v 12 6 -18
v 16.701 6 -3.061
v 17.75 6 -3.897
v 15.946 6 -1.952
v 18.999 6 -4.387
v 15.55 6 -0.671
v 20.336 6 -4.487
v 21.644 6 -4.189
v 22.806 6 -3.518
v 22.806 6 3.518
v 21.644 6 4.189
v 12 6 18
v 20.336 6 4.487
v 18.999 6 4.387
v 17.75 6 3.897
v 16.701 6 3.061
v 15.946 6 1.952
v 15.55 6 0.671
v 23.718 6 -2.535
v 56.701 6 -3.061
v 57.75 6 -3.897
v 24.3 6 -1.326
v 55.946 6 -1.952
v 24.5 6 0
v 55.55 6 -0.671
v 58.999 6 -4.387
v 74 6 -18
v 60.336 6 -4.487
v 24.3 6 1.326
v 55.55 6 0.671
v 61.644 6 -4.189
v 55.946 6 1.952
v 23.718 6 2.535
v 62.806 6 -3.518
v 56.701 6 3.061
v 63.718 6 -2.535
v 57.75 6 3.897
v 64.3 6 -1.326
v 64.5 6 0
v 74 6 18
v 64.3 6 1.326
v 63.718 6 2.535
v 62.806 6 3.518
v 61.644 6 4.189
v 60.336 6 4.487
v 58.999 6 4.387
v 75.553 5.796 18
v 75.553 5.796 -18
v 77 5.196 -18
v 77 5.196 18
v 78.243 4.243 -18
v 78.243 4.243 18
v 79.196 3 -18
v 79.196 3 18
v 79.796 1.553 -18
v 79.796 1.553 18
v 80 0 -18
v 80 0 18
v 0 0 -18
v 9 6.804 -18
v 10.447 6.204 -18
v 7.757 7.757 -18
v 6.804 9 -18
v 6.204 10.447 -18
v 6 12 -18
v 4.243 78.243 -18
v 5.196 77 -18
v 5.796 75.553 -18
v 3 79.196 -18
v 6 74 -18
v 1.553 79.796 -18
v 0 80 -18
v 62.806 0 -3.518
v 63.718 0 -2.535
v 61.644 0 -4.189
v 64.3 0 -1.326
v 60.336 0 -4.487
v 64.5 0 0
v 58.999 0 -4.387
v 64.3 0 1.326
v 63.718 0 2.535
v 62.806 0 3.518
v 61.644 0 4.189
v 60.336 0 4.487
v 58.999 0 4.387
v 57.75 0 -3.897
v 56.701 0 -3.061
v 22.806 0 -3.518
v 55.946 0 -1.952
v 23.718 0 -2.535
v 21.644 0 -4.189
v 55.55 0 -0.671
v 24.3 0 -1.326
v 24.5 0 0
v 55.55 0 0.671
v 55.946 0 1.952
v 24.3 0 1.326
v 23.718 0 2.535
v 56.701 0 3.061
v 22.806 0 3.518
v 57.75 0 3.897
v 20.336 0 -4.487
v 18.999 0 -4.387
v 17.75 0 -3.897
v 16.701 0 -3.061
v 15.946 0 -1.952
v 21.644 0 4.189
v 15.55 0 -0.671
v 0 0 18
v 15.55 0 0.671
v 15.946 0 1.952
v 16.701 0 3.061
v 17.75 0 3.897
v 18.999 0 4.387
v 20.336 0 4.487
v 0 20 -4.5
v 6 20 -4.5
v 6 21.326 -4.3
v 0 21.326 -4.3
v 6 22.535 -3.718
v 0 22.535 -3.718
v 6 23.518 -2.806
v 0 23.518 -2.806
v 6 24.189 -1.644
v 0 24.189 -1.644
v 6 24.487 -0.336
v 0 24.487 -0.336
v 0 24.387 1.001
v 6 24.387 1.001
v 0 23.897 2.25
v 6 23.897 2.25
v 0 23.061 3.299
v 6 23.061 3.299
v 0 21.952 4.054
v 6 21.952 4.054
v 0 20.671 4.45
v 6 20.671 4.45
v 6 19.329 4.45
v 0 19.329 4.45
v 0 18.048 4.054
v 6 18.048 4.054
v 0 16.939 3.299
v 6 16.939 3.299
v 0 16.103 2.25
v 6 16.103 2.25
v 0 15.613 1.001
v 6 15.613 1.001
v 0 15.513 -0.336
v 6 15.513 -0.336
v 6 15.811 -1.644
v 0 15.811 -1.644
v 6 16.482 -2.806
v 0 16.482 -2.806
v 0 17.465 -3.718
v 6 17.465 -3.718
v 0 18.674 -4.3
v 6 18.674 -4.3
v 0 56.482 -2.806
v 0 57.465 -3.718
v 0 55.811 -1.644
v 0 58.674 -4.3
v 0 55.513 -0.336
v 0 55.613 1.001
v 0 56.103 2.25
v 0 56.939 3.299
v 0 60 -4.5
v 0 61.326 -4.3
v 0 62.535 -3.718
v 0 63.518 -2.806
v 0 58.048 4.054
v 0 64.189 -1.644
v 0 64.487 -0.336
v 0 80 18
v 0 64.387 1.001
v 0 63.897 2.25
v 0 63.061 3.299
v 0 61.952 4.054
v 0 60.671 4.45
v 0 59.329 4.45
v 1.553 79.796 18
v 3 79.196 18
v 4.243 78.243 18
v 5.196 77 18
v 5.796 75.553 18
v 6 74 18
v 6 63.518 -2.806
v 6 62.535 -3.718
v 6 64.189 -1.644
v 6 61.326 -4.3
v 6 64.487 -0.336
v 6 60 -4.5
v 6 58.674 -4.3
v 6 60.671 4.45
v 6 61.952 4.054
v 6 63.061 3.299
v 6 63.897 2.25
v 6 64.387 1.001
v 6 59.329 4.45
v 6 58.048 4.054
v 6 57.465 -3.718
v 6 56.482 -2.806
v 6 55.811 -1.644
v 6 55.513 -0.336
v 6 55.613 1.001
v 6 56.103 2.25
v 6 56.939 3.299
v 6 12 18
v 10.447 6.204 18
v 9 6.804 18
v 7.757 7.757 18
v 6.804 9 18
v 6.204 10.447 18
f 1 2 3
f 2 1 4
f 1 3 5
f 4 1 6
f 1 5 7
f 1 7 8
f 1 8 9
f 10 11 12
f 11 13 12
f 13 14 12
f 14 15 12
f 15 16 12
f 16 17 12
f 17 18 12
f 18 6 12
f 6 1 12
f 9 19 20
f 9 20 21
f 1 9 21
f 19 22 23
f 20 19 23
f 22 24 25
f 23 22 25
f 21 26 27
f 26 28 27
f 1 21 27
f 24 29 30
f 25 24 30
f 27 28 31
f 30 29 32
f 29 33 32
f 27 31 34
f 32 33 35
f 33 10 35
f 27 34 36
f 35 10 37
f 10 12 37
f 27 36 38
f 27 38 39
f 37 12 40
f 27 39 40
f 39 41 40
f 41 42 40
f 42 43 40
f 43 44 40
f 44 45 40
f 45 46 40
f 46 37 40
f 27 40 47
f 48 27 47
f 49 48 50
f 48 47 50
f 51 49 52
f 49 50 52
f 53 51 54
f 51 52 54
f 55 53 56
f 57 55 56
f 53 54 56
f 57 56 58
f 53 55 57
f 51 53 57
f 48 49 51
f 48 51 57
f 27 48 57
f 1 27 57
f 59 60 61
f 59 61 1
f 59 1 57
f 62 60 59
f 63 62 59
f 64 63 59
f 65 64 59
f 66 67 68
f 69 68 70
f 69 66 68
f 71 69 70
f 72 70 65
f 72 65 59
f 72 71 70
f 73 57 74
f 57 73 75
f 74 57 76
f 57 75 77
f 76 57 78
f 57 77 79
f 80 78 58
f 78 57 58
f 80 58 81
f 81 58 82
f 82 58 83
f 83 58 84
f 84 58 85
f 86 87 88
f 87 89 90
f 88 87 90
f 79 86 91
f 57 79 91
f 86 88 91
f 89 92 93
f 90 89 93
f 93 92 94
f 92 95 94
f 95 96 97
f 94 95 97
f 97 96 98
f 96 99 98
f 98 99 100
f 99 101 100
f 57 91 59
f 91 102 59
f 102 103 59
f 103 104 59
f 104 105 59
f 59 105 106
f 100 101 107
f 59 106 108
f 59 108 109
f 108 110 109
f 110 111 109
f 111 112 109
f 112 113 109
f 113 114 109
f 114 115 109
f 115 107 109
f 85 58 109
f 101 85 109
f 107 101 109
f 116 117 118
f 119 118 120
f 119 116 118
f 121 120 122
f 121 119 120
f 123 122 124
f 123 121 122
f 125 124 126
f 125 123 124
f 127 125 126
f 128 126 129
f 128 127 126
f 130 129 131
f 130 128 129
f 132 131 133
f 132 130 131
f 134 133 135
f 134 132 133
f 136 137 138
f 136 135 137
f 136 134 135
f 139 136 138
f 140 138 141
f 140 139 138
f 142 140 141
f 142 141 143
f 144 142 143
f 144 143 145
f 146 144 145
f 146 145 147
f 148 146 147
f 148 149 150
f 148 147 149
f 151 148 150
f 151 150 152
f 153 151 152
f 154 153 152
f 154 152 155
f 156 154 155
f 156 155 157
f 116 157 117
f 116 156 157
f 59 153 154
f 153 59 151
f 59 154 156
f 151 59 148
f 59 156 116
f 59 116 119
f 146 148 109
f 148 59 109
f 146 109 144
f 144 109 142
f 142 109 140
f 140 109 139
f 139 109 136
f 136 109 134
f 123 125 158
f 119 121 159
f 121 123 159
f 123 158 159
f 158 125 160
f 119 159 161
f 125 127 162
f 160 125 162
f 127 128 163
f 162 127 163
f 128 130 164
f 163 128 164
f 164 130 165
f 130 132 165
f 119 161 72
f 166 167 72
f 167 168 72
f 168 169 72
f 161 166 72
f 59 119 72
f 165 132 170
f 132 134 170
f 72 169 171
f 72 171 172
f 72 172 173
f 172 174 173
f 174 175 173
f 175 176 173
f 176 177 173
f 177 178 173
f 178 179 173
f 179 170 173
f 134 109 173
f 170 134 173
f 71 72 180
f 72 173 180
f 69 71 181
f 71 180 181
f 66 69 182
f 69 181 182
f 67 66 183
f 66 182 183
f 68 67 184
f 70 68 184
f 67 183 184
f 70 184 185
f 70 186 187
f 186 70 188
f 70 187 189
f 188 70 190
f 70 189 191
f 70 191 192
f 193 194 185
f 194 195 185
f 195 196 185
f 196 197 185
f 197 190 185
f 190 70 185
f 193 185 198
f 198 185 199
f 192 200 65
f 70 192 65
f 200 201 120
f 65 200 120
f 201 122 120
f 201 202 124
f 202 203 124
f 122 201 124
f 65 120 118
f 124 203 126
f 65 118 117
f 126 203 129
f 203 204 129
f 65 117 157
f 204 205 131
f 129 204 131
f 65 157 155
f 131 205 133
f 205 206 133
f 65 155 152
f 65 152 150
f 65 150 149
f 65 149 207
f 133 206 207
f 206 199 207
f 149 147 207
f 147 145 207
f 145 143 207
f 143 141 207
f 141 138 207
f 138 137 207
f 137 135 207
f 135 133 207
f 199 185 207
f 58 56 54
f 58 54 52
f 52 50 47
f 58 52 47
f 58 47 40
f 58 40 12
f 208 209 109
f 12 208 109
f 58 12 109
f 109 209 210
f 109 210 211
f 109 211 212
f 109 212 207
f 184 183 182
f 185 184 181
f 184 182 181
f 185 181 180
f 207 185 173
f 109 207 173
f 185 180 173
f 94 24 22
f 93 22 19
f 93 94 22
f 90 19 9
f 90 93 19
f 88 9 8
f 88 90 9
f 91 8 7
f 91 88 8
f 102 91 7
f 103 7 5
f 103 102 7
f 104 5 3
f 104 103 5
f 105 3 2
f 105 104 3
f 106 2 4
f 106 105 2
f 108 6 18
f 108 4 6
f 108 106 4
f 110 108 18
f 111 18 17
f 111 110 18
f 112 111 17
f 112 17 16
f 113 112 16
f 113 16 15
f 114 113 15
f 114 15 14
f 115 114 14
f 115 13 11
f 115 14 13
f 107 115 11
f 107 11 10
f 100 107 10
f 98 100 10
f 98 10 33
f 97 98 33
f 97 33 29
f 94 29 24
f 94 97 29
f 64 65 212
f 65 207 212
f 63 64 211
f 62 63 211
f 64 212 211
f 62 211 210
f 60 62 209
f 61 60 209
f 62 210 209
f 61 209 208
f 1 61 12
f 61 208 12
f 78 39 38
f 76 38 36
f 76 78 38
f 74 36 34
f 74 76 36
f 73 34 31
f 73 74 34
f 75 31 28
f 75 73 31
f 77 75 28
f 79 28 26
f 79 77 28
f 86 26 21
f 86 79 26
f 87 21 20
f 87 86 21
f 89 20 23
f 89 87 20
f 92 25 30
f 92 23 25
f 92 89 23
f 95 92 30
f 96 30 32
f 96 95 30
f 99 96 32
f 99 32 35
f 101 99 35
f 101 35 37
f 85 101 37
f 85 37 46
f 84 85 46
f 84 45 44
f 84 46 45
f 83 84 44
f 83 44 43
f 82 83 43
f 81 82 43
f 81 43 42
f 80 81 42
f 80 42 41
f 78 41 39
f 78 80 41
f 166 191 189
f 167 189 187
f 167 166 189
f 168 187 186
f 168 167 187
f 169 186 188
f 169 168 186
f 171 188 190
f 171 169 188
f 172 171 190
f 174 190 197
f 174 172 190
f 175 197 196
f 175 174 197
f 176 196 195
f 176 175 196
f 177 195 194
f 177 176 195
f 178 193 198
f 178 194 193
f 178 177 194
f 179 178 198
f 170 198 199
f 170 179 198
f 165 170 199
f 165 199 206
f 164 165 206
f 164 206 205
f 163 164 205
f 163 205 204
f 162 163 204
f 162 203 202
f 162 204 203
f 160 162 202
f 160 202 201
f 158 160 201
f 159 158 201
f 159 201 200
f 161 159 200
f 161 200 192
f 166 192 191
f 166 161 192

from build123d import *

# Parameters (mm, degrees)
BOSS_EXTRUDE1_DEPTH = 18
SKETCH2_R           = 4.5
CUT_EXTRUDE1_DEPTH  = 81
SKETCH3_R           = 4.5
CUT_EXTRUDE2_DEPTH  = 81


with BuildPart() as part:
    # Sketch1 → Boss-Extrude1 (new body, symmetric)
    with BuildSketch(Plane.XY):
        with BuildLine():
            Line((0, 0), (0, 80))
            ThreePointArc((0, 80), (4.242640687, 78.242640687), (6, 74))
            Line((6, 74), (6, 12))
            ThreePointArc((6, 12), (7.757359313, 7.757359313), (12, 6))
            Line((12, 6), (74, 6))
            ThreePointArc((74, 6), (78.242640687, 4.242640687), (80, 0))
            Line((80, 0), (0, 0))
        make_face()
    extrude(amount=BOSS_EXTRUDE1_DEPTH, both=True)

    # Sketch2 → Cut-Extrude1 (cut, through all)
    with BuildSketch(Plane(origin=(0, 0, 0), x_dir=(1, 0, 0), z_dir=(0, 1, 0))):
        with Locations((20, 0)):
            Circle(SKETCH2_R)
        with Locations((60, 0)):
            Circle(SKETCH2_R)
    extrude(amount=CUT_EXTRUDE1_DEPTH, mode=Mode.SUBTRACT)

    # Sketch3 → Cut-Extrude2 (cut, through all)
    with BuildSketch(Plane(origin=(0, 0, 0), x_dir=(0, 0, -1), z_dir=(1, 0, 0))):
        with Locations((0, 20)):
            Circle(SKETCH3_R)
        with Locations((0, 60)):
            Circle(SKETCH3_R)
    extrude(amount=CUT_EXTRUDE2_DEPTH, mode=Mode.SUBTRACT)


solid = part.part
